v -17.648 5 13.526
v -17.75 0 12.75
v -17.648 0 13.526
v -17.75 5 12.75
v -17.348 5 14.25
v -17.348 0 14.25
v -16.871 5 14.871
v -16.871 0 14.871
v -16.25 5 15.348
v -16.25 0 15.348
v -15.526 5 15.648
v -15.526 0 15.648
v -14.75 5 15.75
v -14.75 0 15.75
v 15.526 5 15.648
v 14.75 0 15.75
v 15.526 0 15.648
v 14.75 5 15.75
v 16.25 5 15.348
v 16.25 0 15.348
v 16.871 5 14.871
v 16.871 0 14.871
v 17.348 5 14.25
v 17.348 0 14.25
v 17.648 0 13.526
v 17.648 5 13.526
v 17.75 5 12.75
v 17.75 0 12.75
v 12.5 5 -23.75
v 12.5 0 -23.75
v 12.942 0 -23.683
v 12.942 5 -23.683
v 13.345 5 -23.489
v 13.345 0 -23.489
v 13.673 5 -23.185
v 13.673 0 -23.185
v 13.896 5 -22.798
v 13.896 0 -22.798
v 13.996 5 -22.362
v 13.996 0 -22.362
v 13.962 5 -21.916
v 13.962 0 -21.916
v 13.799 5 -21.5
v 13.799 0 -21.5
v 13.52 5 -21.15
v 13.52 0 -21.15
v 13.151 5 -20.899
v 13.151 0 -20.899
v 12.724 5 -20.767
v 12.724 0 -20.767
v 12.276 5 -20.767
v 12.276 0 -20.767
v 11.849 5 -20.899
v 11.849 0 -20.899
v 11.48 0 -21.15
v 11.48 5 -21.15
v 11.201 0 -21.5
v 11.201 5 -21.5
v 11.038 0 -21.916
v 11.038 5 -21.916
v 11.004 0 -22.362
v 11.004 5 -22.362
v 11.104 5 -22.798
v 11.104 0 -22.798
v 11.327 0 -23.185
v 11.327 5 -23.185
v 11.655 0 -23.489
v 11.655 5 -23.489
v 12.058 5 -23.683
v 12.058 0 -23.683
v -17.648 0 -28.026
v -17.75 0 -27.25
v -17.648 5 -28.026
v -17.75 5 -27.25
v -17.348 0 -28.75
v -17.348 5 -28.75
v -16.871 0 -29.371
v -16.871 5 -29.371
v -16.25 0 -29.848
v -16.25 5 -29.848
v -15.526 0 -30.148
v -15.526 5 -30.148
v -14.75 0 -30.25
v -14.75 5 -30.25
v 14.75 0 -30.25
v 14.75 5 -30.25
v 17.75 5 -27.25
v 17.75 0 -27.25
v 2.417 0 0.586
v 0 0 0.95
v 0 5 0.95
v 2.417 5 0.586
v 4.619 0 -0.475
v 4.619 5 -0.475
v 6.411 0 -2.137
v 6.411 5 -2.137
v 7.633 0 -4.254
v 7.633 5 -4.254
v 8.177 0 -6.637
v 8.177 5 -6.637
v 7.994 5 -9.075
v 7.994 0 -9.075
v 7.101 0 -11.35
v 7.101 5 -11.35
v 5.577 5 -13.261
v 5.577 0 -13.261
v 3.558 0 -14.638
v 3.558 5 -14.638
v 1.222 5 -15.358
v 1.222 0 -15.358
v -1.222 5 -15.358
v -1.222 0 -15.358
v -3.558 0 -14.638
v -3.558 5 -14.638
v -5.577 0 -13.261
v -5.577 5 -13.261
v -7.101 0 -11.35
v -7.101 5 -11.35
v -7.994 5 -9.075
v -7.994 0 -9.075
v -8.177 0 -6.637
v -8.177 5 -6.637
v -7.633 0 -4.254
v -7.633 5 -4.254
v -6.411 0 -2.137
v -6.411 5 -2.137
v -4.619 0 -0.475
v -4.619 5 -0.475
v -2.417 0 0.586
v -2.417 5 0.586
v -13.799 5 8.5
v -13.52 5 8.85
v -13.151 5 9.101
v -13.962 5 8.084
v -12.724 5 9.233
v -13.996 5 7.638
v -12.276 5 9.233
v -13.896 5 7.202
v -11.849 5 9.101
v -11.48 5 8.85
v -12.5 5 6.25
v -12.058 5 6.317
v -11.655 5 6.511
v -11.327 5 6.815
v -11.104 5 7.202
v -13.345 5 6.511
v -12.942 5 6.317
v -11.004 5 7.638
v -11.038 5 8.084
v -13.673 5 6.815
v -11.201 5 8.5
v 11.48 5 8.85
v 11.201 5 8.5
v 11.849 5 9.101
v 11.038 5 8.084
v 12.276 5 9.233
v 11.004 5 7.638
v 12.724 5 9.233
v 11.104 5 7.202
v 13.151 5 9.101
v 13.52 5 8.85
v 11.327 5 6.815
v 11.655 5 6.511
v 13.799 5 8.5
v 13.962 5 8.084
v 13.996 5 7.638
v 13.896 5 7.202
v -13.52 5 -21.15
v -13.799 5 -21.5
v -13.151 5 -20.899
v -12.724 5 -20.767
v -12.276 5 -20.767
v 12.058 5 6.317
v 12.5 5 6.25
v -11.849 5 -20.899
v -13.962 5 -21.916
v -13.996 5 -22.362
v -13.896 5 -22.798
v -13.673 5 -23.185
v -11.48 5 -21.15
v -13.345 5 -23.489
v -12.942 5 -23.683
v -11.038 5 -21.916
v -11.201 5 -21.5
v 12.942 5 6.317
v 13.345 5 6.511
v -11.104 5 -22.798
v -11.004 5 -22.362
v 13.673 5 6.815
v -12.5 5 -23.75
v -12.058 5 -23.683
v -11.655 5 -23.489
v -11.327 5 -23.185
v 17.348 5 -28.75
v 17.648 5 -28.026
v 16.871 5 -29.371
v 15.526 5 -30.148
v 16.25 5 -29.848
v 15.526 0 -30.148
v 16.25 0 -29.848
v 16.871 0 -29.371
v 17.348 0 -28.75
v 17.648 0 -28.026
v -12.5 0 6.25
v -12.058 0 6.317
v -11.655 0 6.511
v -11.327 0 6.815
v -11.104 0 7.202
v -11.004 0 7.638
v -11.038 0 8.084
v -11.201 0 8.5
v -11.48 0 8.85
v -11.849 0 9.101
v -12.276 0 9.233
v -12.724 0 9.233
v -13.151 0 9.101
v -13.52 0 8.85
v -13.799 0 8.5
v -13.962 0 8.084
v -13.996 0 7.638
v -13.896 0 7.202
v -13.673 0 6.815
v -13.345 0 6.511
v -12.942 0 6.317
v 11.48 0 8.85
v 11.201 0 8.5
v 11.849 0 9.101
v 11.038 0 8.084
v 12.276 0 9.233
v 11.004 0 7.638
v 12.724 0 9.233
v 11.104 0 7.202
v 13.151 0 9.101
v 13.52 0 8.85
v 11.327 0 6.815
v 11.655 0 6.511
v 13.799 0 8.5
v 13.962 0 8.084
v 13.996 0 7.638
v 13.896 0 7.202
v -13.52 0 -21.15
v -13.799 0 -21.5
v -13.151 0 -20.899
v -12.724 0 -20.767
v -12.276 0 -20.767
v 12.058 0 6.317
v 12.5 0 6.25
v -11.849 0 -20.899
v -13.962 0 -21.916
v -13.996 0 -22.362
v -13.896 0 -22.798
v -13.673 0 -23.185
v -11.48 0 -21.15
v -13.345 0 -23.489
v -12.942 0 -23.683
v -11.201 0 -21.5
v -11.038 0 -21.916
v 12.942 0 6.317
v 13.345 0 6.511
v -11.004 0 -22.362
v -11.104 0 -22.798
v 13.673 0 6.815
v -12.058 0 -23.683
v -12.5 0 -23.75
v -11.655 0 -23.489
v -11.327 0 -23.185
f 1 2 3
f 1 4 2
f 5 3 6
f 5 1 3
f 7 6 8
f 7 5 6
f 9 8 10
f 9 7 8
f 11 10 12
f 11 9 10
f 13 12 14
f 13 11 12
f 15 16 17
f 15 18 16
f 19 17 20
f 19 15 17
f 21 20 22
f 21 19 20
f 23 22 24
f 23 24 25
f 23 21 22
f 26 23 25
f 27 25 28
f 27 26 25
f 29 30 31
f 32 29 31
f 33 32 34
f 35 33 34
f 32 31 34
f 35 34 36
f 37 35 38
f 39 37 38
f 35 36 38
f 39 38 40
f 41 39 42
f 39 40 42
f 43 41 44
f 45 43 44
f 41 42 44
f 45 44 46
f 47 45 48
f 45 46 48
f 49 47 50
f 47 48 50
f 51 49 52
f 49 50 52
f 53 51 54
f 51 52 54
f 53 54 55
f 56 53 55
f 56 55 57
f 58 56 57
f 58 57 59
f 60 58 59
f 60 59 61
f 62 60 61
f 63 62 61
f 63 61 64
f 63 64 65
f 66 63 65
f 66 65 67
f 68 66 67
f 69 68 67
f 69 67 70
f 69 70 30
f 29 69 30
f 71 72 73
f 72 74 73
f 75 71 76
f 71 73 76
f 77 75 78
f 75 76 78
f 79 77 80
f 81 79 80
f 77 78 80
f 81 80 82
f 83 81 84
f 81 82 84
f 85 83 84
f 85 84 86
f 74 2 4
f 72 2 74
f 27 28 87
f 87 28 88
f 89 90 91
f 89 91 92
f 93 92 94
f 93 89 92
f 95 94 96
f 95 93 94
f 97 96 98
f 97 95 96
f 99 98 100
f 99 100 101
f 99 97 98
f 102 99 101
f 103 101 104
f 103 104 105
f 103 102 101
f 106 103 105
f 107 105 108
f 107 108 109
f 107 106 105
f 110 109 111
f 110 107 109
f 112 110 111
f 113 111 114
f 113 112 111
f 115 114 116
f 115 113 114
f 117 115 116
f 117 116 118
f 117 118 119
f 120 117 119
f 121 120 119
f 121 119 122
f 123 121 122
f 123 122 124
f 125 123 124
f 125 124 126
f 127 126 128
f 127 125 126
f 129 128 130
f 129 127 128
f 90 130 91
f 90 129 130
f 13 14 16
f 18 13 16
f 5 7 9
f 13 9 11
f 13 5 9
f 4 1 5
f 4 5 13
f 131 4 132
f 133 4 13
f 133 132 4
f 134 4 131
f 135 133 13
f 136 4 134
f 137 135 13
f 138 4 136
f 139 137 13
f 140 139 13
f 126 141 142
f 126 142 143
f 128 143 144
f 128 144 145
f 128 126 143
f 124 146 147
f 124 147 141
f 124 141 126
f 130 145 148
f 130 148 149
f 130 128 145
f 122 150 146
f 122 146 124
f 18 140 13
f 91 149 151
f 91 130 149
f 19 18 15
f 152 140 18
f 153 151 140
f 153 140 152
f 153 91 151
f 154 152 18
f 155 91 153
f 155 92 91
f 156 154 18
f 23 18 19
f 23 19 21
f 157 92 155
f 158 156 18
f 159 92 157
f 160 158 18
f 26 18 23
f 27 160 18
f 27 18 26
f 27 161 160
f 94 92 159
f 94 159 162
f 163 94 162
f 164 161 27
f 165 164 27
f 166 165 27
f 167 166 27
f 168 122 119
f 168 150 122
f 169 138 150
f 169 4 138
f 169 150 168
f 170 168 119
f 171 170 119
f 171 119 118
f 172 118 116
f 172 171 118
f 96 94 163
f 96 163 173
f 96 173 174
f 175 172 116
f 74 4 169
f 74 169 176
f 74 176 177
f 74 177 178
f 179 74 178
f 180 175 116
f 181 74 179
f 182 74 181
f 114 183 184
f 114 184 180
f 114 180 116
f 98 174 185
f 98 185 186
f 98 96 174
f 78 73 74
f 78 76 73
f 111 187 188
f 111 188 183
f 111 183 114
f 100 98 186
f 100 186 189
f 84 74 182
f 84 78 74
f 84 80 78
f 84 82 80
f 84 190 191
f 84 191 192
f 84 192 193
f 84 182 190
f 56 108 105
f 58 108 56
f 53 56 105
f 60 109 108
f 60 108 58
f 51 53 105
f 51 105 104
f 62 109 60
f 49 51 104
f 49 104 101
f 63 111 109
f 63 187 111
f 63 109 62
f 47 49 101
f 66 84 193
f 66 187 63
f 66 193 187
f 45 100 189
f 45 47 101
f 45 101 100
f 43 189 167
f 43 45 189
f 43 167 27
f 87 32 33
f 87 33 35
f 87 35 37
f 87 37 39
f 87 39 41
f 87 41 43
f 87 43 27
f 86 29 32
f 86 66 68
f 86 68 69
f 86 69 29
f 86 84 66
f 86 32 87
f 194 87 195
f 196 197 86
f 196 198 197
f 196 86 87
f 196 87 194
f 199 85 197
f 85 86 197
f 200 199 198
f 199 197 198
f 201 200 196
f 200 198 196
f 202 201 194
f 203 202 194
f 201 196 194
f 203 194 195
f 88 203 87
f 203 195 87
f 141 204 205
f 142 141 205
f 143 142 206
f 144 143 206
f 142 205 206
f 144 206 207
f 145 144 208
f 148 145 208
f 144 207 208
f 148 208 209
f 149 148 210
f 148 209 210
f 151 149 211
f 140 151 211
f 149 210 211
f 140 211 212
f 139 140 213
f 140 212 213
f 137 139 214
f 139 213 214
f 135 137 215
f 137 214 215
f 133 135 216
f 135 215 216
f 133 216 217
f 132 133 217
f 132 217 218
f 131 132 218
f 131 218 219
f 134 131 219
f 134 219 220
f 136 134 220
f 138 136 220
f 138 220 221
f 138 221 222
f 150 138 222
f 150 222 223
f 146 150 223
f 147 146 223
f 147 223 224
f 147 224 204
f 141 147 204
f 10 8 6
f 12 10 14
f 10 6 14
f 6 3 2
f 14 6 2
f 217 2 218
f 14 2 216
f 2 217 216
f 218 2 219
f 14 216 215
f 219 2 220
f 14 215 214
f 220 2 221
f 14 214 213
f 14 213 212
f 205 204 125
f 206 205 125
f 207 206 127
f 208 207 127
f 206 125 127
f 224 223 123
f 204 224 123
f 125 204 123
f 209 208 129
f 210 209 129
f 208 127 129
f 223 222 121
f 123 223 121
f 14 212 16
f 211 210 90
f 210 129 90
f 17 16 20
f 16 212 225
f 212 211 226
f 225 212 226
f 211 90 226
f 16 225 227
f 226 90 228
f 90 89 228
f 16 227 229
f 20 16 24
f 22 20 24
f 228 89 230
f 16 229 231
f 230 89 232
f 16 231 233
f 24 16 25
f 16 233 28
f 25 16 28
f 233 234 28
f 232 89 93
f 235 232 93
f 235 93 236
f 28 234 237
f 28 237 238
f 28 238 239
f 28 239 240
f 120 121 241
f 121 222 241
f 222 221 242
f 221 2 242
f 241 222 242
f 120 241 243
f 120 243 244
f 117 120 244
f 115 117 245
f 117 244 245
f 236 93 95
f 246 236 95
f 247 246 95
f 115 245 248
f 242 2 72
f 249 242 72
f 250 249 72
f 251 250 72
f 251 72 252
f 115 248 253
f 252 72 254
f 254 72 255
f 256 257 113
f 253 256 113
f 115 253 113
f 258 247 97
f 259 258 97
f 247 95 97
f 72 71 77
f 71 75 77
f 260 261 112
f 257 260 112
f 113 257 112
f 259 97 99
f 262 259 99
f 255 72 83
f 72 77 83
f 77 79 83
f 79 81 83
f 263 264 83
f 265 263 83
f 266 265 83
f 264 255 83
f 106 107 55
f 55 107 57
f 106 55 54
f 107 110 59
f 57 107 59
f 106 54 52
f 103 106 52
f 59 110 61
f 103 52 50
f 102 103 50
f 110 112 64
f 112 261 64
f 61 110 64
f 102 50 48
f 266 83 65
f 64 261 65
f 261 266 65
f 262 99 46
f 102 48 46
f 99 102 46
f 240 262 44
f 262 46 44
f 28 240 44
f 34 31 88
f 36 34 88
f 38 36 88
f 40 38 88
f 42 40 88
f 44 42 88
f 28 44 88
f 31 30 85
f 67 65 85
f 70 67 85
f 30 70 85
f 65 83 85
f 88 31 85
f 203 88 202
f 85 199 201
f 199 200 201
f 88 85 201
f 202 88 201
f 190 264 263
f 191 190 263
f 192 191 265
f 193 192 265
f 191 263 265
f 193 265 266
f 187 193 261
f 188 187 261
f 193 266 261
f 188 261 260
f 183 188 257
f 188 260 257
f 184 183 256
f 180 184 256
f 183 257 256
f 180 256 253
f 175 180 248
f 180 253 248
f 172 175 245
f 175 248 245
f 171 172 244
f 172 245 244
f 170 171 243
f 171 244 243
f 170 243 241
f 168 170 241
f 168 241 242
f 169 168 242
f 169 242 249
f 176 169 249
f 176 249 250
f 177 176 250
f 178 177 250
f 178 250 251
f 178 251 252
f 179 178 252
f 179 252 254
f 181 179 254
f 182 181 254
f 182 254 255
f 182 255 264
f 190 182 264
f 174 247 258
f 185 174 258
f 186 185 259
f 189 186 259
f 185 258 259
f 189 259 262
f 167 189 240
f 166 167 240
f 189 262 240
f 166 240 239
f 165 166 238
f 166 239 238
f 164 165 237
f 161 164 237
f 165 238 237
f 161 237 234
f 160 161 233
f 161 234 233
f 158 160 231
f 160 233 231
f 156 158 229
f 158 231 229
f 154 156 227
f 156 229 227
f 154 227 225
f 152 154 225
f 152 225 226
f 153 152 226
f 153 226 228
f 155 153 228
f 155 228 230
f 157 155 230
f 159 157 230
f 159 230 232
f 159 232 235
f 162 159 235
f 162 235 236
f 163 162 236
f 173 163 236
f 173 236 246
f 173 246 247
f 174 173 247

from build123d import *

# Parameters (mm, degrees)
SKETCH_1_W          = 35.5
SKETCH_1_H          = 46
SKETCH_1_R          = 8.2
EXTRUDE_1_DEPTH     = 5
FILLET_2_R          = 3
SKETCH_3_R          = 1.5
CUT_EXTRUDE_1_DEPTH = 10


with BuildPart() as part:
    # 草图1 → 凸台-拉伸1 (new body)
    with BuildSketch(Plane(origin=(0, 0, 0), x_dir=(1, 0, 0), z_dir=(0, 1, 0))):
        with Locations((0, 7.25)):
            Rectangle(SKETCH_1_W, SKETCH_1_H)
        with Locations(Location((0, 7.25, 0), (0, 0, 270))):
            Circle(SKETCH_1_R, mode=Mode.SUBTRACT)
    extrude(amount=EXTRUDE_1_DEPTH)

    # 圆角2
    fillet_2_edges = [part.edges().sort_by_distance(p)[0] for p in [
        (-17.75, 2.5, -30.25),
        (17.75, 2.5, -30.25),
        (17.75, 2.5, 15.75),
        (-17.75, 2.5, 15.75),
    ]]
    fillet(fillet_2_edges, radius=FILLET_2_R)

    # 草图3 → 切除-拉伸1 (cut)
    with BuildSketch(Plane.XZ):
        with Locations(Location((-12.5, 7.75, 0), (0, 0, 270))):
            Circle(SKETCH_3_R)
        with Locations(Location((12.5, 7.75, 0), (0, 0, 270))):
            Circle(SKETCH_3_R)
        with Locations(Location((12.5, -22.25, 0), (0, 0, 270))):
            Circle(SKETCH_3_R)
        with Locations(Location((-12.5, -22.25, 0), (0, 0, 270))):
            Circle(SKETCH_3_R)
    extrude(amount=-CUT_EXTRUDE_1_DEPTH, mode=Mode.SUBTRACT)


solid = part.part
